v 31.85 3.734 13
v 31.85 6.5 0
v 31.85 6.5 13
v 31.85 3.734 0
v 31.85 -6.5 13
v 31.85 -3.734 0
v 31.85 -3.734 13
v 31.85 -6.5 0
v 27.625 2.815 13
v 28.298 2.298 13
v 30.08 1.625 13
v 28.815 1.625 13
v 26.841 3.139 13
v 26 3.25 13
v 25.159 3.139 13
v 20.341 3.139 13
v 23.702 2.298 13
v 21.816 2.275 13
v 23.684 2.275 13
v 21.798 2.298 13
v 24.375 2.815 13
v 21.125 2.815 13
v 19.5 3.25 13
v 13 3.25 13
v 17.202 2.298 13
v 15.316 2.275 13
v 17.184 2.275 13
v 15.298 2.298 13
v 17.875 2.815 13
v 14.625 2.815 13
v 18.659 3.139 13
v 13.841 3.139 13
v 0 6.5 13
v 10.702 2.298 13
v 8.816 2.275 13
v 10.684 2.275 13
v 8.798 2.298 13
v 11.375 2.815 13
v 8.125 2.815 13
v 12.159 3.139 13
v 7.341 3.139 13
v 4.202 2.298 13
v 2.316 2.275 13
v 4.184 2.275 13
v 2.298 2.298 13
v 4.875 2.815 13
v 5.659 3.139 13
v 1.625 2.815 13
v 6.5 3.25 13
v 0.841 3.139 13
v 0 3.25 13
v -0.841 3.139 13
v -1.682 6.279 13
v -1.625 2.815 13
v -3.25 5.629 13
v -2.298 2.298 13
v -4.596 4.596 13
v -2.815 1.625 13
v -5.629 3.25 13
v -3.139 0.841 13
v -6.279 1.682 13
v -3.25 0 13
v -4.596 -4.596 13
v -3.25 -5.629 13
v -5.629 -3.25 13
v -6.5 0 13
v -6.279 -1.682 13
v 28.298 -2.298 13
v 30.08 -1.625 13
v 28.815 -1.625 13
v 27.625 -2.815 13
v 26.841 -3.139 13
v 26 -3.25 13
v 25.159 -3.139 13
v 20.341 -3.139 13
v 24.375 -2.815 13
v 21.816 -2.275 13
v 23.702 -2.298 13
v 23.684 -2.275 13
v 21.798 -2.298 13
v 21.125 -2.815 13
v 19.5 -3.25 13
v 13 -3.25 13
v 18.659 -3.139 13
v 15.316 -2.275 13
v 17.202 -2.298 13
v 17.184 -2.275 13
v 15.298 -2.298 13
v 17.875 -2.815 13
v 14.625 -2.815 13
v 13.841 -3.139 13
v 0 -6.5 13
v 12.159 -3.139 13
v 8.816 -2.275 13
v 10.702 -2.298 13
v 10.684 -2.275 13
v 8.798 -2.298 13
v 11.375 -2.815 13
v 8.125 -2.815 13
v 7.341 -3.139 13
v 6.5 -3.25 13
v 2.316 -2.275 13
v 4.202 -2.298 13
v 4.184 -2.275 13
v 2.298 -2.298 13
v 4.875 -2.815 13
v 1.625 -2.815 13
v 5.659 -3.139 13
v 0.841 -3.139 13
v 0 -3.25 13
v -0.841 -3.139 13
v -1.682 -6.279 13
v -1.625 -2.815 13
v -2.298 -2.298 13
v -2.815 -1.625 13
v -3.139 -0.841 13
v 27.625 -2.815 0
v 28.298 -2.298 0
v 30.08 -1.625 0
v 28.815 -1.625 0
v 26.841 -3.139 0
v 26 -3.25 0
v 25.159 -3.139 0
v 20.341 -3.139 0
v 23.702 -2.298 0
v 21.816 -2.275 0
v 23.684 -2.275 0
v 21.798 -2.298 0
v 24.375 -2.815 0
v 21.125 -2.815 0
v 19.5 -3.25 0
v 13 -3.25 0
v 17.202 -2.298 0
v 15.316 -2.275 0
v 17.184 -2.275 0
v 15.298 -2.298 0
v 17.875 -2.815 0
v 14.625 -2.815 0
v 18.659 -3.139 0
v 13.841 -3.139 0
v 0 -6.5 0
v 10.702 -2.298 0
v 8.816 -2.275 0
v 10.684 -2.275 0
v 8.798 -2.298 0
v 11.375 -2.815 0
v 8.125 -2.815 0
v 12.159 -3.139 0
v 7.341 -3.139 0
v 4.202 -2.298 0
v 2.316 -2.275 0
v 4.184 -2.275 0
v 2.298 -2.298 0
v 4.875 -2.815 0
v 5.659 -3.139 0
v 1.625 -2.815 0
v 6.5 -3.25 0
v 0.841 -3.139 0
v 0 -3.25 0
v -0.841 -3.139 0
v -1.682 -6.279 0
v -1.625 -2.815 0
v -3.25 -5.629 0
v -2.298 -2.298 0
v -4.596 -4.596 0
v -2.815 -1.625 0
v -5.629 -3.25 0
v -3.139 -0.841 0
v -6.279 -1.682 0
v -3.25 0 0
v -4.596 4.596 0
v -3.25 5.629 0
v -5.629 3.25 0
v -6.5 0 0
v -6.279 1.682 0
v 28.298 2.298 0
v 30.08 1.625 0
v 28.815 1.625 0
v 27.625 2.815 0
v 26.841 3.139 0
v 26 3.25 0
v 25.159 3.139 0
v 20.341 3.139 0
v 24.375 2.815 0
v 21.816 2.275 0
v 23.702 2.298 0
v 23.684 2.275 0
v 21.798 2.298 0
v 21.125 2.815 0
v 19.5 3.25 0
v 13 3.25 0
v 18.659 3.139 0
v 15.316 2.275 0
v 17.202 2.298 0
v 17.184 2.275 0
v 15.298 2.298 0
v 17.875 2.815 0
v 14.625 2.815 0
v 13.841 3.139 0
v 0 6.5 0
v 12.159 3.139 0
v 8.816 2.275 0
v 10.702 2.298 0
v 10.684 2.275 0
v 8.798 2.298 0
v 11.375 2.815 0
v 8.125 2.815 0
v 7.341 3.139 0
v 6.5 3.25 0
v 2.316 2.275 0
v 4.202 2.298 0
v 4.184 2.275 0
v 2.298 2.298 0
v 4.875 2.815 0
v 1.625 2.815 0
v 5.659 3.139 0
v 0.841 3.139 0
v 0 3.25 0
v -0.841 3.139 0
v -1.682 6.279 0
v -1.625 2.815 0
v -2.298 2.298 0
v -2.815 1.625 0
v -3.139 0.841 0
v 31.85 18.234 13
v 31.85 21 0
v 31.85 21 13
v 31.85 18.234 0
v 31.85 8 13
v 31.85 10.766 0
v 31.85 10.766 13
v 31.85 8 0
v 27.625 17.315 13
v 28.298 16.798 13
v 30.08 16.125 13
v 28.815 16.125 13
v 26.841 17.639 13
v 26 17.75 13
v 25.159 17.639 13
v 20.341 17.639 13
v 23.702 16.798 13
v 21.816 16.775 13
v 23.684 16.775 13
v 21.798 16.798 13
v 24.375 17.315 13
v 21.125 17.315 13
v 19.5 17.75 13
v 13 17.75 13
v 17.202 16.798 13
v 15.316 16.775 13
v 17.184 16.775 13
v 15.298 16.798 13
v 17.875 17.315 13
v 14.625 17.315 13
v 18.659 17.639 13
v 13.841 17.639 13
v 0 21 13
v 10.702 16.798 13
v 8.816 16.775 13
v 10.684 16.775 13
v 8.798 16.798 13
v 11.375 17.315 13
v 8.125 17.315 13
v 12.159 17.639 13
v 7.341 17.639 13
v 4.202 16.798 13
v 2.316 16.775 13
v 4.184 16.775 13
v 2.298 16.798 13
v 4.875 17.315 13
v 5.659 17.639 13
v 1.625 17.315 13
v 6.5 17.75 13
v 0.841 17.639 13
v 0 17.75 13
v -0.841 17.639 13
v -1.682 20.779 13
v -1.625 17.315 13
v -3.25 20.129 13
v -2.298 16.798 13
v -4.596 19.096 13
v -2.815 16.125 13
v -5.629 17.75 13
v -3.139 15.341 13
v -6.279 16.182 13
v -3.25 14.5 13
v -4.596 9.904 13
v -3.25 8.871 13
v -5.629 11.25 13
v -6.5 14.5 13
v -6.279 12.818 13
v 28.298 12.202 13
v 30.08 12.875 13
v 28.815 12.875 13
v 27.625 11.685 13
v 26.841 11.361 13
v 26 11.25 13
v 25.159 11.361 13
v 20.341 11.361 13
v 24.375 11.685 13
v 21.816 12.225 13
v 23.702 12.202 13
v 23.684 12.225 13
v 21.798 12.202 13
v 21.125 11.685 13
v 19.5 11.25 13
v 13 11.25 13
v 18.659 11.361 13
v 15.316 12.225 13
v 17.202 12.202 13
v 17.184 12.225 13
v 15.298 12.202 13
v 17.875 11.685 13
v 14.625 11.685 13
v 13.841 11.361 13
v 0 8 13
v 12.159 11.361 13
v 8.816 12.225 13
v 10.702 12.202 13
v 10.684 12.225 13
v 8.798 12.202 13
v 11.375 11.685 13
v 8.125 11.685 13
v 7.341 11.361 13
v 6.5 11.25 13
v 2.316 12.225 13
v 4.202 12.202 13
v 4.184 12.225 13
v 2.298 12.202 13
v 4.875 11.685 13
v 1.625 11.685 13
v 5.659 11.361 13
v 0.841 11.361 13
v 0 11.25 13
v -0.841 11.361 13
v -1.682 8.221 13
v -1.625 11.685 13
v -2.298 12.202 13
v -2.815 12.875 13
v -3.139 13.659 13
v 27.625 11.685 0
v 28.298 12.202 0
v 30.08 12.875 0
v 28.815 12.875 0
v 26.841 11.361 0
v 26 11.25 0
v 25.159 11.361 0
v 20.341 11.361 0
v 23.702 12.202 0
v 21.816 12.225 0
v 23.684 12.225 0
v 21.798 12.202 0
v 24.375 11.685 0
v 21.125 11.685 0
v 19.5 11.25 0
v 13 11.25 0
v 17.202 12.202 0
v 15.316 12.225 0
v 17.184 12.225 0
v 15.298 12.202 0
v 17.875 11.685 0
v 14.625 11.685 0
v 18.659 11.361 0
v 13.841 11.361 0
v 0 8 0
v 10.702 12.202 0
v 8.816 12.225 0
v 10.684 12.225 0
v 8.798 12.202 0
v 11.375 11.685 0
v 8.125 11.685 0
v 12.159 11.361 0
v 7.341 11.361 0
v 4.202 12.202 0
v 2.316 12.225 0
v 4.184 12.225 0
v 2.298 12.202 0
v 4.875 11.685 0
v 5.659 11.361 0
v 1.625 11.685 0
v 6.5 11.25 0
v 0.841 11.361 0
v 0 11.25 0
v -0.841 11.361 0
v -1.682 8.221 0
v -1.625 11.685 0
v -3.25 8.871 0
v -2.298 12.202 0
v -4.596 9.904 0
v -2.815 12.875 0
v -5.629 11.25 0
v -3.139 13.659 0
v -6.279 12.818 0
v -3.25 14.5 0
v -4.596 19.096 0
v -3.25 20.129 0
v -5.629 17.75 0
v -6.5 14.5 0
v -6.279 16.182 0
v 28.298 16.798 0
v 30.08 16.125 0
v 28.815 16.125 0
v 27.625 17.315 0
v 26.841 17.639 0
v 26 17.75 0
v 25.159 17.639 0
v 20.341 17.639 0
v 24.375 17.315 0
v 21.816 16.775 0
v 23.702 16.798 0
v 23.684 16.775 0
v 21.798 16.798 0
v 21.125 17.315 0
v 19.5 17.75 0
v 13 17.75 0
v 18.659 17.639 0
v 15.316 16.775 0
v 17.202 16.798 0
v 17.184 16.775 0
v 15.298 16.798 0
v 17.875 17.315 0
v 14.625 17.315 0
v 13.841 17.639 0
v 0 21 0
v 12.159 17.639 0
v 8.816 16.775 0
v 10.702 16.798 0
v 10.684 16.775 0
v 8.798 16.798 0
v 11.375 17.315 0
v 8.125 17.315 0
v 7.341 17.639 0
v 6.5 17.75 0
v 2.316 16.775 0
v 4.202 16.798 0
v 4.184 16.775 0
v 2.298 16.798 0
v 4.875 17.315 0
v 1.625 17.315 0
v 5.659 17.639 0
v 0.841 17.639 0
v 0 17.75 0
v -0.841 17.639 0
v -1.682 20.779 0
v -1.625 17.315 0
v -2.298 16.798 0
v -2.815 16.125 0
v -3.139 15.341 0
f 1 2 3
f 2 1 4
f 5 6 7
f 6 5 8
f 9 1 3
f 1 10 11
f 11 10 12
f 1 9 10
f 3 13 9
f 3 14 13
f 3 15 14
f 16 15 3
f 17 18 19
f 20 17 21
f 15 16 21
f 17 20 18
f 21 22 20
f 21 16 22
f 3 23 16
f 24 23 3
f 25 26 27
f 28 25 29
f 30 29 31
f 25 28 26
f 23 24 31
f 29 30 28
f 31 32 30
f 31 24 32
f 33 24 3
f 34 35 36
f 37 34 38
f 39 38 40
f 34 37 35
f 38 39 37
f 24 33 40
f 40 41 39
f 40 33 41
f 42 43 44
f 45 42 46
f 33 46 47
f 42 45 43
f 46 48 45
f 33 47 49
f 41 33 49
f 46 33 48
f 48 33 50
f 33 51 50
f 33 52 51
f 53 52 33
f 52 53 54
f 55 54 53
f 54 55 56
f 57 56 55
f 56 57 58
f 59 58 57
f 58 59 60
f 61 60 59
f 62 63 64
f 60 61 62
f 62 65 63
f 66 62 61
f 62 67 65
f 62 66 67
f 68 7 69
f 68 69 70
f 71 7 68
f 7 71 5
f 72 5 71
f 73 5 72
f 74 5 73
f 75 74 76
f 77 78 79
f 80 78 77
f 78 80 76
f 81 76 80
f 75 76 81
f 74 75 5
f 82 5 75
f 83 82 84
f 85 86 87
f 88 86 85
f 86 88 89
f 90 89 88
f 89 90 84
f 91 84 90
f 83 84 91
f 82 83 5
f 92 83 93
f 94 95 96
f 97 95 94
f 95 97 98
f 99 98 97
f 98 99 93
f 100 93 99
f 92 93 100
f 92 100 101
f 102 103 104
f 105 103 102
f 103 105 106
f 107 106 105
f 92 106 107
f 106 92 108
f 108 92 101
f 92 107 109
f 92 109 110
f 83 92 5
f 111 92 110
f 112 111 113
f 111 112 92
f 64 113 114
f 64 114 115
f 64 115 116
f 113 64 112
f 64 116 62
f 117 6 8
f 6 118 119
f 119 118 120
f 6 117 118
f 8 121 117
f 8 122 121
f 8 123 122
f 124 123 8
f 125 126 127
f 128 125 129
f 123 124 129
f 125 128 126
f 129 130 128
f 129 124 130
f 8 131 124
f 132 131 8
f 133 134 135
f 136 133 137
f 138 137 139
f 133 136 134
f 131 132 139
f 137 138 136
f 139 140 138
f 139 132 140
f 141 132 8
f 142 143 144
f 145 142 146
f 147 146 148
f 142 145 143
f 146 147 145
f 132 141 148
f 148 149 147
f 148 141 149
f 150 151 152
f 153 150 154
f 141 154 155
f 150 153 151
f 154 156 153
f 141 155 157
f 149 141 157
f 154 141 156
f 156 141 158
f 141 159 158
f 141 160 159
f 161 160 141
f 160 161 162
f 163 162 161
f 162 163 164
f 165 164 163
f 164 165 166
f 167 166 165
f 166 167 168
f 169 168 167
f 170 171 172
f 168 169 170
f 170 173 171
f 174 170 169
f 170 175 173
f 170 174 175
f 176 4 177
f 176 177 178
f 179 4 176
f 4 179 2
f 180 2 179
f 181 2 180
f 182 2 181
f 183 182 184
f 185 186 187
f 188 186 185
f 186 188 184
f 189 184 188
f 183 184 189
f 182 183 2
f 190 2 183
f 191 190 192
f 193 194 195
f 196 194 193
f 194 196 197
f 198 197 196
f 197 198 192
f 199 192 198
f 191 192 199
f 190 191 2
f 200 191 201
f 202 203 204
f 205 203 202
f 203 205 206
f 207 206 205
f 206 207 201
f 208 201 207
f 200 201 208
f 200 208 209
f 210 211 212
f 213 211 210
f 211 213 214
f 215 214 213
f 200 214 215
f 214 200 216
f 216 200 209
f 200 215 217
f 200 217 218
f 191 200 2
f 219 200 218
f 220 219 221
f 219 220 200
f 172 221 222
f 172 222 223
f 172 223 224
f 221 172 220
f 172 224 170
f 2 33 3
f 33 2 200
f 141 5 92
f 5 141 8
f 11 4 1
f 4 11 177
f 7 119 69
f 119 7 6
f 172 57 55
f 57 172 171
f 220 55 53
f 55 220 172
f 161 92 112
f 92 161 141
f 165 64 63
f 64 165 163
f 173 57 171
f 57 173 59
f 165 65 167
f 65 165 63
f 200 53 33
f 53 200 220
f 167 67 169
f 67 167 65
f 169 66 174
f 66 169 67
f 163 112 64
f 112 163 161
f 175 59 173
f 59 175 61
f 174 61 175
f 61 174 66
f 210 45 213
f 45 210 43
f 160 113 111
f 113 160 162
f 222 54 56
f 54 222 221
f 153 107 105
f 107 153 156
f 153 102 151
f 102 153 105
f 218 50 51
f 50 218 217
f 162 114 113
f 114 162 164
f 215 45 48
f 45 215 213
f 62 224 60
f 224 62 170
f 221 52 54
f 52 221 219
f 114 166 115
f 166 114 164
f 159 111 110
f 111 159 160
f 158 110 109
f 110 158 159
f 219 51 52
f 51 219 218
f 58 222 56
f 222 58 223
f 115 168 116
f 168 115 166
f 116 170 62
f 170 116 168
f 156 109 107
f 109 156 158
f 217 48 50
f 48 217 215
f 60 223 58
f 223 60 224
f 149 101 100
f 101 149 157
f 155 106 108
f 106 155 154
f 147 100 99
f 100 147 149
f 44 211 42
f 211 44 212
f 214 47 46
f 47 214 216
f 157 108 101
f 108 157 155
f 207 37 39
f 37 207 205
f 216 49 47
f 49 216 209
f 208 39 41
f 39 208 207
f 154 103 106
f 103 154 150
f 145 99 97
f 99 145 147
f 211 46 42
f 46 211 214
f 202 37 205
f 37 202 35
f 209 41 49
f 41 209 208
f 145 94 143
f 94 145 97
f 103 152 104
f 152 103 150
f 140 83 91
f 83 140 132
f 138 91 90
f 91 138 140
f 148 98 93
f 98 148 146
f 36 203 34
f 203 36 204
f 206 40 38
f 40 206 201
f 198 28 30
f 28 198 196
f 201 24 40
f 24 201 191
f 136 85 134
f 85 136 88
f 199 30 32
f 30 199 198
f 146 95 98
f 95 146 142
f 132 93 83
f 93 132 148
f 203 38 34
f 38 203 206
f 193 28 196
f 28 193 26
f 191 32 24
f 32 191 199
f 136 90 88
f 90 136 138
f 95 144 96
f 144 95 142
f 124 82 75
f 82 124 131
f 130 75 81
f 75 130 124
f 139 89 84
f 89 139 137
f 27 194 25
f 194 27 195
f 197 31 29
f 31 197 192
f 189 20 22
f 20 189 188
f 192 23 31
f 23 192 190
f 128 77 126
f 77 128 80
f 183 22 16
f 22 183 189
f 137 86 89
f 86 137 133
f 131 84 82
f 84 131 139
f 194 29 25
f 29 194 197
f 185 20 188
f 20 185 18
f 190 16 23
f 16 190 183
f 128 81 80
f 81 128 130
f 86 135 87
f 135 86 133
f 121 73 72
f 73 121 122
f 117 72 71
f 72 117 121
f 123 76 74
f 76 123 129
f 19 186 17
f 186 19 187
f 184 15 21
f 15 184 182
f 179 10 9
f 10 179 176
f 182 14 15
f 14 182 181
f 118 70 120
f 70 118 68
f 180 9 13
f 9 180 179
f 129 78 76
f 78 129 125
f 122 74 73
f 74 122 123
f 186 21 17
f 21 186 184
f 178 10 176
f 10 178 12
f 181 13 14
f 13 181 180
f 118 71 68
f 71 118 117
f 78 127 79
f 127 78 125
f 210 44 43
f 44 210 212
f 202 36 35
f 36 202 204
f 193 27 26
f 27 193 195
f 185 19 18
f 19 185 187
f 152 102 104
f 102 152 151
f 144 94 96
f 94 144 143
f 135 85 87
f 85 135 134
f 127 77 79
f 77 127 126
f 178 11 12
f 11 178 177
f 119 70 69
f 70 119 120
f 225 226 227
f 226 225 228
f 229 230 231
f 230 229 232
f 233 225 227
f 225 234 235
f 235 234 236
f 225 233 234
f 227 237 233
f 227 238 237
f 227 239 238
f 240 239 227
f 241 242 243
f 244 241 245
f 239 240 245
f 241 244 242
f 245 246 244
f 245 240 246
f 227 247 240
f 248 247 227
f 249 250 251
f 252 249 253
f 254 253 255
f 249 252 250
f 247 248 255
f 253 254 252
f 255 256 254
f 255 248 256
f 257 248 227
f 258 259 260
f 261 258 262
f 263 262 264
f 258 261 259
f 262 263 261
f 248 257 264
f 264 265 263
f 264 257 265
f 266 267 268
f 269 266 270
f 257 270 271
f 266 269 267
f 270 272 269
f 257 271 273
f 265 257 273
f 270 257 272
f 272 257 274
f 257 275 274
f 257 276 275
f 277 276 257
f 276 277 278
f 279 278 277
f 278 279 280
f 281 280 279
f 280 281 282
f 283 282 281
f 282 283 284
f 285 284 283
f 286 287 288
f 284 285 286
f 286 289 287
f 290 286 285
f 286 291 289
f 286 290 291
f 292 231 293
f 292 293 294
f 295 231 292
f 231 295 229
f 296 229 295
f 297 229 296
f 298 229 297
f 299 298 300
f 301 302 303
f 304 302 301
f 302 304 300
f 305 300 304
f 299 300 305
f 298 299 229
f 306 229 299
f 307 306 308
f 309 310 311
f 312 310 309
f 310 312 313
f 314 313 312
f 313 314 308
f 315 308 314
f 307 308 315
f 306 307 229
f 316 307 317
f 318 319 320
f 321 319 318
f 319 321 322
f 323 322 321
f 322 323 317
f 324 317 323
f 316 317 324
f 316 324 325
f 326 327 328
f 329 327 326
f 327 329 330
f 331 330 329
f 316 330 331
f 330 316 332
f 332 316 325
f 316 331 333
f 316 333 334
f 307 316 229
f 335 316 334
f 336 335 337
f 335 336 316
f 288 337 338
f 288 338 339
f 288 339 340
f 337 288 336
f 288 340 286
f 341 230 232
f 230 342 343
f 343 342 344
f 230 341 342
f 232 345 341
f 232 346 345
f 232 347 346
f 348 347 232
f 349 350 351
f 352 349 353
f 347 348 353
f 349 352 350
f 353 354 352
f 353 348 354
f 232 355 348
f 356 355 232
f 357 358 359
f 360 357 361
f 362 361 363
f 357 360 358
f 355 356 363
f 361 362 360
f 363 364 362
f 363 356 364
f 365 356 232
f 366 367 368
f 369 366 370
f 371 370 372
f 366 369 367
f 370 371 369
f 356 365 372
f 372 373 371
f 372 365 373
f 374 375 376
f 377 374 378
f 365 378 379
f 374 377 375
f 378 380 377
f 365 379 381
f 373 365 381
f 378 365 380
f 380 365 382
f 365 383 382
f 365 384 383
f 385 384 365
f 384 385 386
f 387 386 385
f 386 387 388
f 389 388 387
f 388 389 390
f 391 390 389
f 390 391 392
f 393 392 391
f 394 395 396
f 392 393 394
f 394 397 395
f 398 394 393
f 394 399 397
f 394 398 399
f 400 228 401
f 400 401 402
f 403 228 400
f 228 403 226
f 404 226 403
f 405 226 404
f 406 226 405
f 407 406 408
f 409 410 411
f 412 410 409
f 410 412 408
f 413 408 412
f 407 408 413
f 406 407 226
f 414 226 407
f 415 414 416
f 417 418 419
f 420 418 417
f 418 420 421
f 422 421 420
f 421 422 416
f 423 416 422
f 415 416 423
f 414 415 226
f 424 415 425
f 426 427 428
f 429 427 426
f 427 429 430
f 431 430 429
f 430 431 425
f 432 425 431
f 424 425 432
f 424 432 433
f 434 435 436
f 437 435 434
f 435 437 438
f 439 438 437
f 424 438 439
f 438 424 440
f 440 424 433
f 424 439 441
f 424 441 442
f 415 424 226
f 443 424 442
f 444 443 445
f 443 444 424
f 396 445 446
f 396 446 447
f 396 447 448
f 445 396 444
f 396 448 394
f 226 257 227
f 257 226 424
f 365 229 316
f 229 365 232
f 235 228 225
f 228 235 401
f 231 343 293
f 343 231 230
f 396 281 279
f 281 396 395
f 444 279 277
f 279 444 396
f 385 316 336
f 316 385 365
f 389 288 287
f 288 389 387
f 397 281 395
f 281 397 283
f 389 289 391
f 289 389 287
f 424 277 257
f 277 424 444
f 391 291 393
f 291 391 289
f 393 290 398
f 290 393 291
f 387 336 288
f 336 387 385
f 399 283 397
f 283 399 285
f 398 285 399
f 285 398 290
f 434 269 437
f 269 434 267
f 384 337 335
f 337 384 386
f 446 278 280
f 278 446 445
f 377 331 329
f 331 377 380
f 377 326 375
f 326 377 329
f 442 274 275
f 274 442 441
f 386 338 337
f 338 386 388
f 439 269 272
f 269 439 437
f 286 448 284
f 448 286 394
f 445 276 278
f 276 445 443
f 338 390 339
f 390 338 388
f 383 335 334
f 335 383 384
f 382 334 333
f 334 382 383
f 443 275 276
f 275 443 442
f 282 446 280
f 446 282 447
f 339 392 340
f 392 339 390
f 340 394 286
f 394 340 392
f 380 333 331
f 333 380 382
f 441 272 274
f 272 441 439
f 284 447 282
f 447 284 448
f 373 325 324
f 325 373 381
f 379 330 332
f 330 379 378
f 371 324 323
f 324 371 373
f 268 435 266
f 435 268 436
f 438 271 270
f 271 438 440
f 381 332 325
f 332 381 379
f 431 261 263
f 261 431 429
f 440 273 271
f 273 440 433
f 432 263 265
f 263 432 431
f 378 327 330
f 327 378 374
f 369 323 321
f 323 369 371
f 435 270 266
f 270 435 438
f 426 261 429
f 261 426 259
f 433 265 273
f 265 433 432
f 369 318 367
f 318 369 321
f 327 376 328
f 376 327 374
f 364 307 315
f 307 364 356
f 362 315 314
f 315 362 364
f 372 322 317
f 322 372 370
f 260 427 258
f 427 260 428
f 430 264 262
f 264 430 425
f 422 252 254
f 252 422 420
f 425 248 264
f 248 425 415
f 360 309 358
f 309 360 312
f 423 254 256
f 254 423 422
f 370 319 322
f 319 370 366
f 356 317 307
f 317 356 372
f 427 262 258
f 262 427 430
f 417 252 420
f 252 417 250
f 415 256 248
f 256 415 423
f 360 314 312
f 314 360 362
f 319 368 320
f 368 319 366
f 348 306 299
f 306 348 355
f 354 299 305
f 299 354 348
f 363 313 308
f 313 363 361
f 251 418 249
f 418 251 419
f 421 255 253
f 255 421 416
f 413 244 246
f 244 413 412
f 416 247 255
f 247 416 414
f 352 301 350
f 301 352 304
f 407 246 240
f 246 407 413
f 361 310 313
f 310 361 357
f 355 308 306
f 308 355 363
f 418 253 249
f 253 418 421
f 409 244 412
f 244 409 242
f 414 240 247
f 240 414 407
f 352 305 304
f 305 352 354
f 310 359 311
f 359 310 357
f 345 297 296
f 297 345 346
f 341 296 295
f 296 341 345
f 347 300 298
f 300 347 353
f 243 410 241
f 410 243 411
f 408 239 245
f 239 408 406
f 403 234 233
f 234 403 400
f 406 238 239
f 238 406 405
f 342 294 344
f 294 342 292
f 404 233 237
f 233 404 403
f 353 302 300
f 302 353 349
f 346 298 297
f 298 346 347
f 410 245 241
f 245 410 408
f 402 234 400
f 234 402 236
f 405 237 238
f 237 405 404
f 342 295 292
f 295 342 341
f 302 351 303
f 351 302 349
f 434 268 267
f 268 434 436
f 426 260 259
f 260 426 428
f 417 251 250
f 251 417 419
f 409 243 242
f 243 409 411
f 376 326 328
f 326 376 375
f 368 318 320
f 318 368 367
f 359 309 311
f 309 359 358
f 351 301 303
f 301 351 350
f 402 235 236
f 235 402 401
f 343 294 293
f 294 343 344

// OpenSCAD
// updates: you only need to set the diameter of your cable and the loop count

d=6.5;  // cable diameter - probably set it a bit larger than the actual value
n=5;    // cable loop count

nx=1;   // how many you want
ny=2;   // 2 * 4 = 8 pcs

d1=d/2;
d2=(3/4)*d;
b=2*d;
l=(n+0.9)*d;
h=b;

e=0.001;

module outer(l,h,b,d1,d2){
    cylinder(r=b/2,h=h,$fn=24);
    difference(){
        translate([0,-b/2,0])cube([l-b/2,b,h]);
        translate([l-b/2-d2*sin(40),0,-e])rotate([0,0,-40])cube([b,b,h+2*e]);
        translate([l-b/2-d2*sin(40),0,-e])rotate([0,0,-50])cube([b,b,h+2*e]);
    }
}

module inner(l,h,b,d1,d2){
    translate([0,0,-e]){
        for (i=[0:n-1]){
            translate([i*d,0,0])cylinder(r=b/2-d1,h=h+2*e,$fn=24);
        }
        translate([0,-(b-2.6*d1)/2,0])cube([l-b,b-2.6*d1,h+2*e]);
        translate([0,-(b-2*d2)/2,0])cube([l,b-2*d2,h+2*e]);
    }
}

module clip(l,h,b,d1,d2){
    difference(){
        outer(l,h,b,d1,d2);
        inner(l,h,b,d1,d2);
    }
}

for(xi=[0:nx-1])
    for(yi=[0:ny-1])
        translate([xi*(l+1.5),yi*(b+1.5),0])clip(l,h,b,d1,d2);
